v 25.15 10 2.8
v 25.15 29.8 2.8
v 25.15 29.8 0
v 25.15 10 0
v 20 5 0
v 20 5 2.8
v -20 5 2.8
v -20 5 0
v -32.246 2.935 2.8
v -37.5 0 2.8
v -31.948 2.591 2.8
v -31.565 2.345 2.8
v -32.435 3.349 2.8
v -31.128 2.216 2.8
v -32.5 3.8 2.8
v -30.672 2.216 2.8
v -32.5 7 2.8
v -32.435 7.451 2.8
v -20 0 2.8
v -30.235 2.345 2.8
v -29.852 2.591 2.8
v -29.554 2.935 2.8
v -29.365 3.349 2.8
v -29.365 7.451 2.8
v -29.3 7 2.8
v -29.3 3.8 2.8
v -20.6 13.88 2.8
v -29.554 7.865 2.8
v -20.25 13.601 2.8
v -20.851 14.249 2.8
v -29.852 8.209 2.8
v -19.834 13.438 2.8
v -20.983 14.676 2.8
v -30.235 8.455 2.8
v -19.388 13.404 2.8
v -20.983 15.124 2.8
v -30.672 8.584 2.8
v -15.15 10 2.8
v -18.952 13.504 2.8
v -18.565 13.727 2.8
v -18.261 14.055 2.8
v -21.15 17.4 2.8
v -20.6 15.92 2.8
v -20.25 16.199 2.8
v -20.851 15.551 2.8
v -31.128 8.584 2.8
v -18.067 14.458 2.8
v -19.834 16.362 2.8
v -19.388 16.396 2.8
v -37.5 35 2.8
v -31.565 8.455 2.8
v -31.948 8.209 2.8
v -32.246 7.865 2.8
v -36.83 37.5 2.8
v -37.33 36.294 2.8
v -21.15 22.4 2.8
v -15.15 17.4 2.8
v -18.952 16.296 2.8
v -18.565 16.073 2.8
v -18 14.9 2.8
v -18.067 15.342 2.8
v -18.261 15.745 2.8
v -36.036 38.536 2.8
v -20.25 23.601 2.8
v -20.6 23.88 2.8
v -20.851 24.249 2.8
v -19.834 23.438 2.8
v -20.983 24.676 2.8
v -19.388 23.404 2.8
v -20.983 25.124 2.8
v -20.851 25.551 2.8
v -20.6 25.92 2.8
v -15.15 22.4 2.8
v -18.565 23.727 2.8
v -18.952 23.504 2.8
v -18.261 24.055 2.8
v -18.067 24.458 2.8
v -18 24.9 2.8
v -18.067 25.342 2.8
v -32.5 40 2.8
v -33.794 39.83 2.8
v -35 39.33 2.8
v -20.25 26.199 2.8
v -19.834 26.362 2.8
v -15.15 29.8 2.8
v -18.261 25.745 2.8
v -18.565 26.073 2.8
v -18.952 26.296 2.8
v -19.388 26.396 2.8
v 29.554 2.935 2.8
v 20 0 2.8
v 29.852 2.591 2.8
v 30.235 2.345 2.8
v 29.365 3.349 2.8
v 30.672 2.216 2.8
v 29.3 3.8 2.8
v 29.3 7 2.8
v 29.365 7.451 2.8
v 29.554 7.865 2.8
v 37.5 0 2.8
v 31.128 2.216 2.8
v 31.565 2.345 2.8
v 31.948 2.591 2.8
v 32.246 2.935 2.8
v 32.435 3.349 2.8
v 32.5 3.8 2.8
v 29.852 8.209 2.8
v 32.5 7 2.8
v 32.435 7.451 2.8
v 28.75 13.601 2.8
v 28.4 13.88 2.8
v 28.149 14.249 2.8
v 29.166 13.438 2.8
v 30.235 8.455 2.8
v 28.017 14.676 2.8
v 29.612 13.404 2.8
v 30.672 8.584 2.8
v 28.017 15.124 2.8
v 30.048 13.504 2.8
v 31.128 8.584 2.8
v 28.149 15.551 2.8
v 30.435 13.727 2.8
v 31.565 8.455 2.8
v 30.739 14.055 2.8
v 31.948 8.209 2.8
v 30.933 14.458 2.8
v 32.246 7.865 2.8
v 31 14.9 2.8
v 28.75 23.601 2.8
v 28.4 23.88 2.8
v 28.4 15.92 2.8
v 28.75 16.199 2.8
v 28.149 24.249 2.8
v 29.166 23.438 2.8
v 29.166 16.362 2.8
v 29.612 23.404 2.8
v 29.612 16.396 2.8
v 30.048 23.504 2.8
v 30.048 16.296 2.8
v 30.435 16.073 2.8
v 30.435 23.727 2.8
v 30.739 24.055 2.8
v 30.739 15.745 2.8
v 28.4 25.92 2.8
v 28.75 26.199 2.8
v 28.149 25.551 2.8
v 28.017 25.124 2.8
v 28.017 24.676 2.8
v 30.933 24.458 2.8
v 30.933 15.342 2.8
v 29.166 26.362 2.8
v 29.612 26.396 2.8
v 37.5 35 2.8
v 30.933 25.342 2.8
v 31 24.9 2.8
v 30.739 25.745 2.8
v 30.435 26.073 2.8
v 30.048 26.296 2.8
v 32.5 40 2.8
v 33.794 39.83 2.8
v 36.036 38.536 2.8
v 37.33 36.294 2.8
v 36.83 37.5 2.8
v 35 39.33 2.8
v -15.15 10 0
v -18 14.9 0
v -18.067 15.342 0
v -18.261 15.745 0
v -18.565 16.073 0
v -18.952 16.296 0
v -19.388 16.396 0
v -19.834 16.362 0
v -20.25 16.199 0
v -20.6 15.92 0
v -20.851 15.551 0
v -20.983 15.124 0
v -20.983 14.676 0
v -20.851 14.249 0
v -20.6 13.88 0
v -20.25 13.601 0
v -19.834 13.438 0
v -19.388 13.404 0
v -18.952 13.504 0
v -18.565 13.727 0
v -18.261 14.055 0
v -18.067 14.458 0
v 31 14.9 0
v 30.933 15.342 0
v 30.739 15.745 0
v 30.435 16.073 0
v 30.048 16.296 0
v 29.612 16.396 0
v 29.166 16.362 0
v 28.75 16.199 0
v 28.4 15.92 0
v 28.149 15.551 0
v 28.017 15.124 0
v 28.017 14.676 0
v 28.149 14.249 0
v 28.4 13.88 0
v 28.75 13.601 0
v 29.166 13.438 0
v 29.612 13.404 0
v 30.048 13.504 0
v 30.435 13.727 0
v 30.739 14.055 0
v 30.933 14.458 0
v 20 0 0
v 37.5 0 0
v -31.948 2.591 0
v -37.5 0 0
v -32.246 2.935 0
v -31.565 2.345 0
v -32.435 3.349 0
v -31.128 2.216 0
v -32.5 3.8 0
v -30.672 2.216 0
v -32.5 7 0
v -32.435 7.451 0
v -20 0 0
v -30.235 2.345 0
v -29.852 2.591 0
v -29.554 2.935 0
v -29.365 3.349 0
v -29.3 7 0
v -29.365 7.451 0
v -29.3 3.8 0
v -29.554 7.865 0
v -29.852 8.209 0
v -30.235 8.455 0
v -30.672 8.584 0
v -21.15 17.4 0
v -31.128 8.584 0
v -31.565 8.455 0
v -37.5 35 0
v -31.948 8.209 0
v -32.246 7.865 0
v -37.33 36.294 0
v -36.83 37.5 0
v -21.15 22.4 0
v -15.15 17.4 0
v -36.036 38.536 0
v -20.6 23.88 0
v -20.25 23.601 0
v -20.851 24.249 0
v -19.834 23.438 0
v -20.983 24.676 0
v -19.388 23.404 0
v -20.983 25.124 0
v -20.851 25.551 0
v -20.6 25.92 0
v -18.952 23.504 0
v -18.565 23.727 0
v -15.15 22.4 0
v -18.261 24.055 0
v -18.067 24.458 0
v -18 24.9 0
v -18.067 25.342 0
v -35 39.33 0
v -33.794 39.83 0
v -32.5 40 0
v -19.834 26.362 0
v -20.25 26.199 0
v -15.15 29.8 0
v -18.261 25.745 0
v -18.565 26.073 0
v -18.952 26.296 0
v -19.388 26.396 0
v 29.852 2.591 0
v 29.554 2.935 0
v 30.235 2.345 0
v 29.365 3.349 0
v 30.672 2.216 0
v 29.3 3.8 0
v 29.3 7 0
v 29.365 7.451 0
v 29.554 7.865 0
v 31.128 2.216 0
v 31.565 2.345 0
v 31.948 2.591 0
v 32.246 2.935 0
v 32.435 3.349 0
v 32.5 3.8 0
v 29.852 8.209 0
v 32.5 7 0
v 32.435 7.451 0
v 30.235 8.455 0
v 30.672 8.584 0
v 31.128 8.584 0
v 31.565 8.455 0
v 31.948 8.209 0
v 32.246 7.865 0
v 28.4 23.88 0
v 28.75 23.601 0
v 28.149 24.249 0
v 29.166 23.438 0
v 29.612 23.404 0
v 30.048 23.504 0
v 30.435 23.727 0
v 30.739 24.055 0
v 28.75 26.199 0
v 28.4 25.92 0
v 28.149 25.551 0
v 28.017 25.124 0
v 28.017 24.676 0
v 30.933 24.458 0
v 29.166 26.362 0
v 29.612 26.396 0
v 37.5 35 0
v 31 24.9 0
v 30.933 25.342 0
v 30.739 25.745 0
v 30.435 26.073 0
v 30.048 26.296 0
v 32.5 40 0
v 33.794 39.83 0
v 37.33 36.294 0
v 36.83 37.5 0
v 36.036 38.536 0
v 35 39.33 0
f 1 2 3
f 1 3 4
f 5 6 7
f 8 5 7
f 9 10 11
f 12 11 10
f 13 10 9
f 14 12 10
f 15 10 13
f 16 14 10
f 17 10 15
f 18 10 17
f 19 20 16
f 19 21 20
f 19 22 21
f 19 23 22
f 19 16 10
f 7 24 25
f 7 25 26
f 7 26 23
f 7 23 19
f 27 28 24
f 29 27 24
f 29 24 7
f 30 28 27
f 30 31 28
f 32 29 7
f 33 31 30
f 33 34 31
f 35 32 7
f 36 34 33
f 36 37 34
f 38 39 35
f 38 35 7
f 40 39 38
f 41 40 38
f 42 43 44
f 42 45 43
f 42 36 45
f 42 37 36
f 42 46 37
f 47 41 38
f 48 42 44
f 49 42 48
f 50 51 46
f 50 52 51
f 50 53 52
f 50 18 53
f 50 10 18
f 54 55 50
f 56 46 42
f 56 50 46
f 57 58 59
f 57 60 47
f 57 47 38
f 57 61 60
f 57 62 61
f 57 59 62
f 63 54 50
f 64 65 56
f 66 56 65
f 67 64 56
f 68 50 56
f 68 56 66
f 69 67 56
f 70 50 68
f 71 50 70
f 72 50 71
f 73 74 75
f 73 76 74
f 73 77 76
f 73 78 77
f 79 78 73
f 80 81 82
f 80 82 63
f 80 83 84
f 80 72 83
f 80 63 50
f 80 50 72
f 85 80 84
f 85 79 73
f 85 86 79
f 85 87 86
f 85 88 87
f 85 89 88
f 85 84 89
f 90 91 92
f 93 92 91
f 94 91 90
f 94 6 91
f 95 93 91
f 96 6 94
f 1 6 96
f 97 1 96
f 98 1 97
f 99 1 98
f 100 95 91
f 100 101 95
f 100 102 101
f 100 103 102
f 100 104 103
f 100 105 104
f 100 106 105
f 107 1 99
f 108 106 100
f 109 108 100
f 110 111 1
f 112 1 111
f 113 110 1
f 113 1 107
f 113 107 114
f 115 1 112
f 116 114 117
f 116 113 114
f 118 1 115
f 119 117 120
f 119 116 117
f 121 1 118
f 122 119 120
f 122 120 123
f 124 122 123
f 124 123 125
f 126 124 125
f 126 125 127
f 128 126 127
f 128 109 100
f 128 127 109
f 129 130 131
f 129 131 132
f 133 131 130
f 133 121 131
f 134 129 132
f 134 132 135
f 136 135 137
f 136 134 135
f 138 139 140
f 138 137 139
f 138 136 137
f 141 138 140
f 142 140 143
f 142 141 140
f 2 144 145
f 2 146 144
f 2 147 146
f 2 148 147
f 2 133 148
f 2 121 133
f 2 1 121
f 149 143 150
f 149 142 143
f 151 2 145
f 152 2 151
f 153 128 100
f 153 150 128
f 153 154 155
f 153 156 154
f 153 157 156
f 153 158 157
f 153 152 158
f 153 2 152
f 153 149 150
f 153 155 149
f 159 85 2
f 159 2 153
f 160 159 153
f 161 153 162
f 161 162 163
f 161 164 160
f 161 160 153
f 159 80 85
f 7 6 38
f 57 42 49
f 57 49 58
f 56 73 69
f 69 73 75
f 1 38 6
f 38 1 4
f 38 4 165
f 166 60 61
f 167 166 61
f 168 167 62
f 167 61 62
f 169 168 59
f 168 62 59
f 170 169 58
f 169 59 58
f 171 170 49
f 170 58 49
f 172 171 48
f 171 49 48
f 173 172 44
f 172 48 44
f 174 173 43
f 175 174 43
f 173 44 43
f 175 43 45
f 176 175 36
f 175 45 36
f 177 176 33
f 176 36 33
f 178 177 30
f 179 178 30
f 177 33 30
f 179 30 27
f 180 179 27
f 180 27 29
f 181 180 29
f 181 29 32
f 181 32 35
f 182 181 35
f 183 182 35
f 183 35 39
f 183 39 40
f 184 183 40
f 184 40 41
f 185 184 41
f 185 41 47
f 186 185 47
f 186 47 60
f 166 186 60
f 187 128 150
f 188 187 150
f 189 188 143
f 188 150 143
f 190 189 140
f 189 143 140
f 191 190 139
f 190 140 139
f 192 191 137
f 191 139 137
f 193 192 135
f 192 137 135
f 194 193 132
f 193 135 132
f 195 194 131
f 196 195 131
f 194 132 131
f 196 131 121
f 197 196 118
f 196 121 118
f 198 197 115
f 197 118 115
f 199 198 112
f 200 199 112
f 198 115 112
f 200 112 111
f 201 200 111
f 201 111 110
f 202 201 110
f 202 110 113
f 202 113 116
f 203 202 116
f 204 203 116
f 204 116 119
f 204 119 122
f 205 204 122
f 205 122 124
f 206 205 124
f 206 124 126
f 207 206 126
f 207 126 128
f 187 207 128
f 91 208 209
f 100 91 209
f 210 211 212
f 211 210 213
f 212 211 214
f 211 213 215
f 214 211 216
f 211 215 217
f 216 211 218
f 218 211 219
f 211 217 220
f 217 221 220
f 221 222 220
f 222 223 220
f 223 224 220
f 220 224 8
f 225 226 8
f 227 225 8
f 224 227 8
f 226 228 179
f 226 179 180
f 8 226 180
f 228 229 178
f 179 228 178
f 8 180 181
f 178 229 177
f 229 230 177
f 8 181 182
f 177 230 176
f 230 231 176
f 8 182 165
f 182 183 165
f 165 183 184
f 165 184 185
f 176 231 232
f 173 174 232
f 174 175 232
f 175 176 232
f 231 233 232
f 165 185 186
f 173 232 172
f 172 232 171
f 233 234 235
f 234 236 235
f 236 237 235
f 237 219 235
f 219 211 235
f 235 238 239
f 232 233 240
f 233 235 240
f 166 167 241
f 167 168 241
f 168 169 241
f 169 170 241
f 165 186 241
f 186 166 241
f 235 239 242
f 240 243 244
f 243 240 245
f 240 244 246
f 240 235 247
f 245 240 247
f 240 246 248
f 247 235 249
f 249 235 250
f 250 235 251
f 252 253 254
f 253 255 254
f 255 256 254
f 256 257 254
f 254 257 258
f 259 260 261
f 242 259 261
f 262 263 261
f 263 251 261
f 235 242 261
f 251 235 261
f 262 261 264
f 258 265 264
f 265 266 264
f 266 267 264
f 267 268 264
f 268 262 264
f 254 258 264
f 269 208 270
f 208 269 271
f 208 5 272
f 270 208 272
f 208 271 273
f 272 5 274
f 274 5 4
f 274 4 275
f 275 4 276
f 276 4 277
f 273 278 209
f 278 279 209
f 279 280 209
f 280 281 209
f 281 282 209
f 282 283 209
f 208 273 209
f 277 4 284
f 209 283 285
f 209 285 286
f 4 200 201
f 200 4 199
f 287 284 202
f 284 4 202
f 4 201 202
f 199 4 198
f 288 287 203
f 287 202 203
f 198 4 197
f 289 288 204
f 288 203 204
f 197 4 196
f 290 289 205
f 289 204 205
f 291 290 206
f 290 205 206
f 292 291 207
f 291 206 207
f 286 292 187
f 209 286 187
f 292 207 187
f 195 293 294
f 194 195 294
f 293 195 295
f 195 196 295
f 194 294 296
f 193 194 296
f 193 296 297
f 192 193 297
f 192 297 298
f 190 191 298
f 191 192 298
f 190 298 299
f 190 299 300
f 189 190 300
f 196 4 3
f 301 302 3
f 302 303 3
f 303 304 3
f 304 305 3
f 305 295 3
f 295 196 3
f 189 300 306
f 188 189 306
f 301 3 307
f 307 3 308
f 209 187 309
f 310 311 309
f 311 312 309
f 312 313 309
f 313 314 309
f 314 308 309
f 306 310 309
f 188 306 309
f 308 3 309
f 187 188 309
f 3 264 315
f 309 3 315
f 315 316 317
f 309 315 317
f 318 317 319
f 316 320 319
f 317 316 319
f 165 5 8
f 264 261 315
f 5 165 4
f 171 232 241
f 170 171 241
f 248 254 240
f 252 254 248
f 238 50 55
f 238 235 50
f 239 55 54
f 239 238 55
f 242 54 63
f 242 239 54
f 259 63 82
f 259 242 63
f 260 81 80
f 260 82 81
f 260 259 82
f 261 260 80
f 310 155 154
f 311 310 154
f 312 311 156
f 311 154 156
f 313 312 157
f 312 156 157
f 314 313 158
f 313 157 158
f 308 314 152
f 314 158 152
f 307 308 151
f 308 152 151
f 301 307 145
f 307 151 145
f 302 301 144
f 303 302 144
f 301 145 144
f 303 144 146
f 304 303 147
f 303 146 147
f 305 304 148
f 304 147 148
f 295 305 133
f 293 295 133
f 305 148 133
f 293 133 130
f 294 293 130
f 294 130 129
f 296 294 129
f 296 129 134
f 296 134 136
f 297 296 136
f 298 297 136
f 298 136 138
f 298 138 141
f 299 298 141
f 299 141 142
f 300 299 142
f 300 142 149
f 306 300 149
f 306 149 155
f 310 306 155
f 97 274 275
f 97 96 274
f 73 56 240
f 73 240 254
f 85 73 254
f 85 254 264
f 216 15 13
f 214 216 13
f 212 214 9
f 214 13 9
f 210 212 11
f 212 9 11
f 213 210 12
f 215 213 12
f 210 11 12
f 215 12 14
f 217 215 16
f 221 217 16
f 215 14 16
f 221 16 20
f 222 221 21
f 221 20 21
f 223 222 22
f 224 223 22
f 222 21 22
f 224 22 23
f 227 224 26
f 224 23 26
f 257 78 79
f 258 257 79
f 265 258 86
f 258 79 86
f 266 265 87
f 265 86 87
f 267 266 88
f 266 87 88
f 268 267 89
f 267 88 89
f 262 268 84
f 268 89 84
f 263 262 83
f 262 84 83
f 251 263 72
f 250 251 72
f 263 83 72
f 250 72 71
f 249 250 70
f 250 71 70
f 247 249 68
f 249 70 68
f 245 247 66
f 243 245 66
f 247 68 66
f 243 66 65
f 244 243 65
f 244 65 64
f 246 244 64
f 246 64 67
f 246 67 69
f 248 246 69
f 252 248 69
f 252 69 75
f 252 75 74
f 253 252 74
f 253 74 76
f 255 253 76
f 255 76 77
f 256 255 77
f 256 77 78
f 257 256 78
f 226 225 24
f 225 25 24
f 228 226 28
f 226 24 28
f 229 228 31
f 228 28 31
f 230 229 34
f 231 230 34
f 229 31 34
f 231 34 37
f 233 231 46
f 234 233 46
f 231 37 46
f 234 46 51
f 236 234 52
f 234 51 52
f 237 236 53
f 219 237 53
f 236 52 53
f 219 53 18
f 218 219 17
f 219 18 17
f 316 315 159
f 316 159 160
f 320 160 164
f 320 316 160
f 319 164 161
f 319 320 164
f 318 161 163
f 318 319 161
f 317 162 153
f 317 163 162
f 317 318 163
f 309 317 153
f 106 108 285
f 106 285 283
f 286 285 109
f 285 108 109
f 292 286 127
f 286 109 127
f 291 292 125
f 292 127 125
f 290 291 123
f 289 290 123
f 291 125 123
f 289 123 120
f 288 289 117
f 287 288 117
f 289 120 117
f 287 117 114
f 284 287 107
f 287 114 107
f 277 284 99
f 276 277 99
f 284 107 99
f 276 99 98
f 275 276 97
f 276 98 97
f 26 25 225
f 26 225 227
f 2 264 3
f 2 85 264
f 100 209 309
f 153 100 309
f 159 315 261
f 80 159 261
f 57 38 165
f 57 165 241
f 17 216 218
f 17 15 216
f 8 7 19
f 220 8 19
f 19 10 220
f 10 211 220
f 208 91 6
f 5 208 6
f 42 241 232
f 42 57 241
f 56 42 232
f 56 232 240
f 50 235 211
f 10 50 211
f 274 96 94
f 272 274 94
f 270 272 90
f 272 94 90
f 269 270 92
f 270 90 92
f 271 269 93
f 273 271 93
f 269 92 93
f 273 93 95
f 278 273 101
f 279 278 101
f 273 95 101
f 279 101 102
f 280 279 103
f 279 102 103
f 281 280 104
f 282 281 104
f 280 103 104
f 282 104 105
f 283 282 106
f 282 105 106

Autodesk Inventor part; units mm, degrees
ref_plane "YZ Plane" through (0, 0, 0) normal (1, 0, 0) x (0, 1, 0)
ref_plane "XZ Plane" through (0, 0, 0) normal (0, 1, 0) x (-1, 0, 0)
ref_plane "XY Plane" through (0, 0, 0) normal (0, 0, 1) x (1, 0, 0)
sketch "Sketch1" plane through (0, 0, 0) normal (0, 0, 1) x (1, 0, 0)
  line L0 (-53.9497, 0) -> (53.9497, 0) projected
  line L1 (0, -8.2071) -> (0, 49.2426) projected
  line L2 (-37.5, 0) -> (37.5, 0)
  line L3 (37.5, 0) -> (37.5, 35)
  line L4 (32.5, 40) -> (-32.5, 40)
  line L5 (-37.5, 35) -> (-37.5, 0)
  arc A0 (-32.5, 40) -> (-37.5, 35) centre (-32.5, 35) ccw
  arc A1 (37.5, 35) -> (32.5, 40) centre (32.5, 35) ccw
  point P0 (0, 0)
  point P1 (37.5, 40)
  point P2 (-37.5, 40)
  dimension "d0" = 75
  dimension "d1" = 40
  dimension "d2" = 37.5
  dimension "d5" = 5
extrude "Extrusion1" add sketch "Sketch1" along normal blind 2.8
sketch "Sketch2" plane through (0, 0, 2.8) normal (0, 0, 1) x (1, 0, 0)
  line L0 (37.5, 0) -> (-37.5, 0) projected
  line L1 (37.5, 35) -> (37.5, 0) projected
  line L2 (-20, 0) -> (20, 0)
  line L3 (20, 0) -> (20, 5)
  line L4 (20, 5) -> (-20, 5)
  line L5 (-20, 5) -> (-20, 0)
  line L6 (-15.15, 22.4) -> (-15.15, 29.8)
  line L7 (-15.15, 29.8) -> (25.15, 29.8)
  line L8 (-21.15, 22.4) -> (-15.15, 22.4)
  line L9 (-21.15, 17.4) -> (-21.15, 22.4)
  line L10 (-15.15, 17.4) -> (-21.15, 17.4)
  line L11 (-15.15, 10) -> (-15.15, 17.4)
  line L12 (25.15, 10) -> (-15.15, 10)
  line L13 (25.15, 29.8) -> (25.15, 10)
  line L14 (-15.15, 29.8) -> (25.15, 29.8)
  point P0 (0, 0)
  dimension "d6" = 17.5
  dimension "d7" = 40
extrude "Extrusion2" cut sketch "Sketch2" against normal blind 10
sketch "Sketch3" plane through (0, 0, 2.8) normal (0, 0, 1) x (1, 0, 0)
  circle A0 centre (-19.5, 24.9) radius 2.5
  circle A1 centre (-19.5, 14.9) radius 2.5
  circle A2 centre (29.5, 14.9) radius 2.5
  circle A3 centre (29.5, 24.9) radius 2.5
  circle A4 centre (29.5, 14.9) radius 1.5
  circle A5 centre (29.5, 24.9) radius 1.5
  circle A6 centre (-19.5, 14.9) radius 1.5
  circle A7 centre (-19.5, 24.9) radius 1.5
  line L0 (-15.15, 17.4) -> (-21.15, 17.4) projected
  line L1 (29.3, 5.4) -> (29.3, 7)
  line L2 (32.5, 7) -> (32.5, 3.8)
  line L3 (29.3, 3.8) -> (29.3, 5.4)
  arc A8 (29.3, 3.8) -> (32.5, 3.8) centre (30.9, 3.8) ccw
  arc A9 (32.5, 7) -> (29.3, 7) centre (30.9, 7) ccw
  line L4 (-15.15, 10) -> (-15.15, 17.4) projected
  line L5 (-32.5, 5.4) -> (-32.5, 7)
  line L6 (-29.3, 7) -> (-29.3, 3.8)
  line L7 (-32.5, 3.8) -> (-32.5, 5.4)
  arc A10 (-29.3, 7) -> (-32.5, 7) centre (-30.9, 7) ccw
  arc A11 (-32.5, 3.8) -> (-29.3, 3.8) centre (-30.9, 3.8) ccw
  point P0 (0, 0)
  dimension "d10" = 3
  dimension "d11" = 3
  dimension "d12" = 3
  dimension "d13" = 3
extrude "Extrusion3" cut sketch "Sketch3" against normal through all contours A4 | A5 | A6 | A7 | L1 A9 L2 A8 L3 | L5 A10 L6 A11 L7
equation "\"d2\" = 0.5 * d0"
properties part number "Acrylic_YawServoSupport_1"
